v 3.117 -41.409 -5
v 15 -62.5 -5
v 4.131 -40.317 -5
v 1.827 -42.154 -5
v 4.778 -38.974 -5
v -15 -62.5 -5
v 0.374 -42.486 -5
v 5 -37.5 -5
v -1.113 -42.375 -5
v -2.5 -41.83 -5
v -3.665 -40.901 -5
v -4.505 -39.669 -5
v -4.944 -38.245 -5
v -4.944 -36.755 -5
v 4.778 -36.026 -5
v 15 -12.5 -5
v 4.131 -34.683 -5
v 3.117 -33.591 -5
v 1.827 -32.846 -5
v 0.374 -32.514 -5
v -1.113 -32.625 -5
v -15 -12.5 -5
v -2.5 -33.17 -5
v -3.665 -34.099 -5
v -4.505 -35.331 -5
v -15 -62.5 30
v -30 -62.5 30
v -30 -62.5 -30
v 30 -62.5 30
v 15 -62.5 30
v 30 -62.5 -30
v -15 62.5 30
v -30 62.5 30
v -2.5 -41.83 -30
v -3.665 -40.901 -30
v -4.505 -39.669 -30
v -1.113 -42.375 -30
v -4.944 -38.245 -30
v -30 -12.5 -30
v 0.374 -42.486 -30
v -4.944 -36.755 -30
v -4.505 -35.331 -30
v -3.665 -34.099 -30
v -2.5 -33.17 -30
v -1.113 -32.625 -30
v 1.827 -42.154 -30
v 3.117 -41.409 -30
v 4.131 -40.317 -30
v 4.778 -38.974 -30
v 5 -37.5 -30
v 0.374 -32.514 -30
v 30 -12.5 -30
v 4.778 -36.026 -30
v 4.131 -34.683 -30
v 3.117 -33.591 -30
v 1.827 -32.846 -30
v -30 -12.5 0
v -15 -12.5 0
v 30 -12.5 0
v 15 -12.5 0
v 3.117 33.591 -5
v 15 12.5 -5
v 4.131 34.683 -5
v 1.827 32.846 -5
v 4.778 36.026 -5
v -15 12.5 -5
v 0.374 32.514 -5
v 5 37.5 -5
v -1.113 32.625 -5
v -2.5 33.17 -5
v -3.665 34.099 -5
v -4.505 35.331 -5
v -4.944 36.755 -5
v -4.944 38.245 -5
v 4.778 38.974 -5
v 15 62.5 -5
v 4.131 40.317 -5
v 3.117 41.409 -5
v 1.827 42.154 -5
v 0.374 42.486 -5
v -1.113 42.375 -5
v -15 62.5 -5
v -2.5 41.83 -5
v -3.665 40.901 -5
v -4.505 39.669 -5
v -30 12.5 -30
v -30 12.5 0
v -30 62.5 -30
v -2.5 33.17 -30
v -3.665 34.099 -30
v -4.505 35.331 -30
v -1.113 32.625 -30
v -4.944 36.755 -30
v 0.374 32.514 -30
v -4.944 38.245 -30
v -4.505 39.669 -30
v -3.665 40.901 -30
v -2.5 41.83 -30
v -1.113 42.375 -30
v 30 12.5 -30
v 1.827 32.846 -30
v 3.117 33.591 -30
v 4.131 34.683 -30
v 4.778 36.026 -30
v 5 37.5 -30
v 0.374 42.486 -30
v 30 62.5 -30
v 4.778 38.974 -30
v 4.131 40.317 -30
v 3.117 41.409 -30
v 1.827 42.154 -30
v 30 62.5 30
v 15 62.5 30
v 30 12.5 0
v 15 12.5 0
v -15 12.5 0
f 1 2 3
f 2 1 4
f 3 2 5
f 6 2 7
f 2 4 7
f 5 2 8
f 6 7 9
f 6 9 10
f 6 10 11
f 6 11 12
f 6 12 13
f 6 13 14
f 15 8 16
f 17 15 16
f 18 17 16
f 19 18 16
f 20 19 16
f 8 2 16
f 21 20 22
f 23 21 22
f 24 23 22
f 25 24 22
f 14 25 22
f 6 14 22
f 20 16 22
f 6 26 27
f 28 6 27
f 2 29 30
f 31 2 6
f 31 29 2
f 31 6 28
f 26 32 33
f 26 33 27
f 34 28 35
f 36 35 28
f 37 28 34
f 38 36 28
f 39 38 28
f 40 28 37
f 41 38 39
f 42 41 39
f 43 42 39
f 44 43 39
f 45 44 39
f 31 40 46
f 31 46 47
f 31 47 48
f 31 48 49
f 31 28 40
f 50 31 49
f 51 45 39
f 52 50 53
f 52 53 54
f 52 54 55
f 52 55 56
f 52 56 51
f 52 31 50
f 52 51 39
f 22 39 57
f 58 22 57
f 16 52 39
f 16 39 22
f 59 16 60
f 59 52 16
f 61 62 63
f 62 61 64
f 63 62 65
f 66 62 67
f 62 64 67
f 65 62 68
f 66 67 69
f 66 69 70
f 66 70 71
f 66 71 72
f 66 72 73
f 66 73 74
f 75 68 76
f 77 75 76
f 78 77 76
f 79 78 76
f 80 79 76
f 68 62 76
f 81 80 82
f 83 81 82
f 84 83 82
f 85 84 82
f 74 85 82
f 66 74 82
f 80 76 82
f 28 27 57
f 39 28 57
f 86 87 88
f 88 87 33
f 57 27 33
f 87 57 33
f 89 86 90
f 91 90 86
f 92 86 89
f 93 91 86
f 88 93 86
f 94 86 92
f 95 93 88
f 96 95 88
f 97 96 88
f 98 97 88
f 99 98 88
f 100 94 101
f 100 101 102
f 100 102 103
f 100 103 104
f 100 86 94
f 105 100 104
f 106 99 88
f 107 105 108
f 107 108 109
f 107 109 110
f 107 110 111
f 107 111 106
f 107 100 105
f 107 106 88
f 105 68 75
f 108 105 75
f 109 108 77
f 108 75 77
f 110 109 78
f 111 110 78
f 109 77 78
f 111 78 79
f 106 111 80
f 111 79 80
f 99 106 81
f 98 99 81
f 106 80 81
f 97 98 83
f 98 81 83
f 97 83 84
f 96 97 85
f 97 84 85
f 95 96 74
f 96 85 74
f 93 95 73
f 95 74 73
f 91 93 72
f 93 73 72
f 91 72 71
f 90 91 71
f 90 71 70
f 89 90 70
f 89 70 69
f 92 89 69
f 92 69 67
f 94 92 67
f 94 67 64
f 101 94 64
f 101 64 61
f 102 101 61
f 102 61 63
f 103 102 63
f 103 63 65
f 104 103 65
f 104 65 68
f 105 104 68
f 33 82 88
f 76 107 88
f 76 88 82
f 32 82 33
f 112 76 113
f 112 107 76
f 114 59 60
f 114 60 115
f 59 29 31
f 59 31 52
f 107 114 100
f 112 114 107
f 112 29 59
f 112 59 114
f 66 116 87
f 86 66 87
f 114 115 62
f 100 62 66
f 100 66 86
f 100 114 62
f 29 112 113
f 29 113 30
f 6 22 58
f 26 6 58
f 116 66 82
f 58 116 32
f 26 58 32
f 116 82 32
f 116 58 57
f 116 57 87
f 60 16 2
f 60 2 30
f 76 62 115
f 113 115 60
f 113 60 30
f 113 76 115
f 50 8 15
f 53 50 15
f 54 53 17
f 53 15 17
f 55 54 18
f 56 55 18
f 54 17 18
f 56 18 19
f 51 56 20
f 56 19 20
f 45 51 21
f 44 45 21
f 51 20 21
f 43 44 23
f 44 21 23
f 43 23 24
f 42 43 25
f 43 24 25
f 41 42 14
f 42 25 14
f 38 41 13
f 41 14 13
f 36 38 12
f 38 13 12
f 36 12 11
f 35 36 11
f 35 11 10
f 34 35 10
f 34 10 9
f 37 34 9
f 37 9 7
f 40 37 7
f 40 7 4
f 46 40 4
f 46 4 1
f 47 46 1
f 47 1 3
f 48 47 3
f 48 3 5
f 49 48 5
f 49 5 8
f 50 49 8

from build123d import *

# Parameters (mm, degrees)
BOSS_EXTRUDE1_DEPTH = 30
SKETCH2_W           = 30
SKETCH2_H           = 35
CUT_EXTRUDE1_DEPTH  = 133.003787824
SKETCH3_R           = 5
CUT_EXTRUDE2_DEPTH  = 78.661122835


with BuildPart() as part:
    # Sketch1 → Boss-Extrude1 (new, symmetric)
    with BuildSketch(Plane.YZ):
        Polygon((-62.5, 30), (-62.5, -30), (-12.5, -30), (-12.5, 0), (12.5, 0), (12.5, -30), (62.5, -30), (62.5, 30), align=None)
    extrude(amount=BOSS_EXTRUDE1_DEPTH, both=True)

    # Sketch2 → Cut-Extrude1 (cut, through all)
    with BuildSketch(Plane(origin=(0, 62.5, 0), x_dir=(-1, 0, 0), z_dir=(0, 1, 0))):
        with Locations((0, 12.5)):
            Rectangle(SKETCH2_W, SKETCH2_H)
    extrude(amount=-CUT_EXTRUDE1_DEPTH, mode=Mode.SUBTRACT)

    # Sketch3 → Cut-Extrude2 (cut, through all)
    with BuildSketch(Plane.XY.offset(-5)):
        with Locations((0, -37.5)):
            Circle(SKETCH3_R)
        with Locations((0, 37.5)):
            Circle(SKETCH3_R)
    extrude(amount=-CUT_EXTRUDE2_DEPTH, mode=Mode.SUBTRACT)


solid = part.part
